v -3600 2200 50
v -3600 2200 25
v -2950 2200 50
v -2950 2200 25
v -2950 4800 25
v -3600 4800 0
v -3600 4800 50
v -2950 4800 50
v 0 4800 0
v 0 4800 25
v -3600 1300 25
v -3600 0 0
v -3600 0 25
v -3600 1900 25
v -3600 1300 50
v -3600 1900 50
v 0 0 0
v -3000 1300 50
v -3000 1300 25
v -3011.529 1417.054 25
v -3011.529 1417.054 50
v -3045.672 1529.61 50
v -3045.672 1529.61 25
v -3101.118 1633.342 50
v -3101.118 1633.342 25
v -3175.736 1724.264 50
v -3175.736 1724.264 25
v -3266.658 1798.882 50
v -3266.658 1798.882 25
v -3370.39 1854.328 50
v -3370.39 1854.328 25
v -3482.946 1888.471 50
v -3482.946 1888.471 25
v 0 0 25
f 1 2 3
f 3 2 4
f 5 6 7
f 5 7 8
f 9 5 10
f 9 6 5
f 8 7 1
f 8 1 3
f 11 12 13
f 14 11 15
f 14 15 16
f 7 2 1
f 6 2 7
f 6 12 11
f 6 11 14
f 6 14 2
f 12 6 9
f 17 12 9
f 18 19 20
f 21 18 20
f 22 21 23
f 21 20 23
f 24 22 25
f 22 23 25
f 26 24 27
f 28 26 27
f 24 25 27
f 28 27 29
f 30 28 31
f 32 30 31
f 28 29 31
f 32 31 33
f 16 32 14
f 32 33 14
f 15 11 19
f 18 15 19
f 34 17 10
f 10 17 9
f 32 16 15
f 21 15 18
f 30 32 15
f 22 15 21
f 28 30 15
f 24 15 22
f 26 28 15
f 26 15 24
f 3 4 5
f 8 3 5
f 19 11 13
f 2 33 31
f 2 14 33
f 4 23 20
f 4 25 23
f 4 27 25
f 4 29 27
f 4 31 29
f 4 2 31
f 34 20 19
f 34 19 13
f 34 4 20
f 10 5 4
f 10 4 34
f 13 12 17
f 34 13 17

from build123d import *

# Parameters (mm, degrees)
F0_W     = 650
F0_H     = 2600
F1_DEPTH = 25
F2_W     = 650
F2_H     = 2600
F3_DEPTH = 25


with BuildPart() as f1:
    # F0 (on Top) → F1 (new body)
    with BuildSketch(Plane.XY):
        with Locations((-3275, 3500)):
            Rectangle(F0_W, F0_H)
        with BuildLine():
            Line((-3600, 1900), (-3600, 1300))
            Line((-3600, 1300), (-3000, 1300))
            ThreePointArc((-3000, 1300), (-3175.735931, 1724.264069), (-3600, 1900))
        make_face()
        with BuildLine():
            Line((-3600, 0), (0, 0))
            Line((0, 0), (0, 4800))
            Line((0, 4800), (-2950, 4800))
            Line((-2950, 4800), (-2950, 2200))
            Line((-2950, 2200), (-3600, 2200))
            Line((-3600, 2200), (-3600, 1900))
            ThreePointArc((-3600, 1900), (-3175.735931, 1724.264069), (-3000, 1300))
            Line((-3000, 1300), (-3600, 1300))
            Line((-3600, 1300), (-3600, 0))
        make_face()
    extrude(amount=F1_DEPTH)

    # F2 (on face) → F3 (join)
    with BuildSketch(Plane.XY.offset(25)):
        with Locations((-3275, 3500)):
            Rectangle(F2_W, F2_H)
        with BuildLine():
            ThreePointArc((-3000, 1300), (-3175.735931, 1724.264069), (-3600, 1900))
            Line((-3600, 1900), (-3600, 1300))
            Line((-3600, 1300), (-3000, 1300))
        make_face()
    extrude(amount=F3_DEPTH)


solid = f1.part
